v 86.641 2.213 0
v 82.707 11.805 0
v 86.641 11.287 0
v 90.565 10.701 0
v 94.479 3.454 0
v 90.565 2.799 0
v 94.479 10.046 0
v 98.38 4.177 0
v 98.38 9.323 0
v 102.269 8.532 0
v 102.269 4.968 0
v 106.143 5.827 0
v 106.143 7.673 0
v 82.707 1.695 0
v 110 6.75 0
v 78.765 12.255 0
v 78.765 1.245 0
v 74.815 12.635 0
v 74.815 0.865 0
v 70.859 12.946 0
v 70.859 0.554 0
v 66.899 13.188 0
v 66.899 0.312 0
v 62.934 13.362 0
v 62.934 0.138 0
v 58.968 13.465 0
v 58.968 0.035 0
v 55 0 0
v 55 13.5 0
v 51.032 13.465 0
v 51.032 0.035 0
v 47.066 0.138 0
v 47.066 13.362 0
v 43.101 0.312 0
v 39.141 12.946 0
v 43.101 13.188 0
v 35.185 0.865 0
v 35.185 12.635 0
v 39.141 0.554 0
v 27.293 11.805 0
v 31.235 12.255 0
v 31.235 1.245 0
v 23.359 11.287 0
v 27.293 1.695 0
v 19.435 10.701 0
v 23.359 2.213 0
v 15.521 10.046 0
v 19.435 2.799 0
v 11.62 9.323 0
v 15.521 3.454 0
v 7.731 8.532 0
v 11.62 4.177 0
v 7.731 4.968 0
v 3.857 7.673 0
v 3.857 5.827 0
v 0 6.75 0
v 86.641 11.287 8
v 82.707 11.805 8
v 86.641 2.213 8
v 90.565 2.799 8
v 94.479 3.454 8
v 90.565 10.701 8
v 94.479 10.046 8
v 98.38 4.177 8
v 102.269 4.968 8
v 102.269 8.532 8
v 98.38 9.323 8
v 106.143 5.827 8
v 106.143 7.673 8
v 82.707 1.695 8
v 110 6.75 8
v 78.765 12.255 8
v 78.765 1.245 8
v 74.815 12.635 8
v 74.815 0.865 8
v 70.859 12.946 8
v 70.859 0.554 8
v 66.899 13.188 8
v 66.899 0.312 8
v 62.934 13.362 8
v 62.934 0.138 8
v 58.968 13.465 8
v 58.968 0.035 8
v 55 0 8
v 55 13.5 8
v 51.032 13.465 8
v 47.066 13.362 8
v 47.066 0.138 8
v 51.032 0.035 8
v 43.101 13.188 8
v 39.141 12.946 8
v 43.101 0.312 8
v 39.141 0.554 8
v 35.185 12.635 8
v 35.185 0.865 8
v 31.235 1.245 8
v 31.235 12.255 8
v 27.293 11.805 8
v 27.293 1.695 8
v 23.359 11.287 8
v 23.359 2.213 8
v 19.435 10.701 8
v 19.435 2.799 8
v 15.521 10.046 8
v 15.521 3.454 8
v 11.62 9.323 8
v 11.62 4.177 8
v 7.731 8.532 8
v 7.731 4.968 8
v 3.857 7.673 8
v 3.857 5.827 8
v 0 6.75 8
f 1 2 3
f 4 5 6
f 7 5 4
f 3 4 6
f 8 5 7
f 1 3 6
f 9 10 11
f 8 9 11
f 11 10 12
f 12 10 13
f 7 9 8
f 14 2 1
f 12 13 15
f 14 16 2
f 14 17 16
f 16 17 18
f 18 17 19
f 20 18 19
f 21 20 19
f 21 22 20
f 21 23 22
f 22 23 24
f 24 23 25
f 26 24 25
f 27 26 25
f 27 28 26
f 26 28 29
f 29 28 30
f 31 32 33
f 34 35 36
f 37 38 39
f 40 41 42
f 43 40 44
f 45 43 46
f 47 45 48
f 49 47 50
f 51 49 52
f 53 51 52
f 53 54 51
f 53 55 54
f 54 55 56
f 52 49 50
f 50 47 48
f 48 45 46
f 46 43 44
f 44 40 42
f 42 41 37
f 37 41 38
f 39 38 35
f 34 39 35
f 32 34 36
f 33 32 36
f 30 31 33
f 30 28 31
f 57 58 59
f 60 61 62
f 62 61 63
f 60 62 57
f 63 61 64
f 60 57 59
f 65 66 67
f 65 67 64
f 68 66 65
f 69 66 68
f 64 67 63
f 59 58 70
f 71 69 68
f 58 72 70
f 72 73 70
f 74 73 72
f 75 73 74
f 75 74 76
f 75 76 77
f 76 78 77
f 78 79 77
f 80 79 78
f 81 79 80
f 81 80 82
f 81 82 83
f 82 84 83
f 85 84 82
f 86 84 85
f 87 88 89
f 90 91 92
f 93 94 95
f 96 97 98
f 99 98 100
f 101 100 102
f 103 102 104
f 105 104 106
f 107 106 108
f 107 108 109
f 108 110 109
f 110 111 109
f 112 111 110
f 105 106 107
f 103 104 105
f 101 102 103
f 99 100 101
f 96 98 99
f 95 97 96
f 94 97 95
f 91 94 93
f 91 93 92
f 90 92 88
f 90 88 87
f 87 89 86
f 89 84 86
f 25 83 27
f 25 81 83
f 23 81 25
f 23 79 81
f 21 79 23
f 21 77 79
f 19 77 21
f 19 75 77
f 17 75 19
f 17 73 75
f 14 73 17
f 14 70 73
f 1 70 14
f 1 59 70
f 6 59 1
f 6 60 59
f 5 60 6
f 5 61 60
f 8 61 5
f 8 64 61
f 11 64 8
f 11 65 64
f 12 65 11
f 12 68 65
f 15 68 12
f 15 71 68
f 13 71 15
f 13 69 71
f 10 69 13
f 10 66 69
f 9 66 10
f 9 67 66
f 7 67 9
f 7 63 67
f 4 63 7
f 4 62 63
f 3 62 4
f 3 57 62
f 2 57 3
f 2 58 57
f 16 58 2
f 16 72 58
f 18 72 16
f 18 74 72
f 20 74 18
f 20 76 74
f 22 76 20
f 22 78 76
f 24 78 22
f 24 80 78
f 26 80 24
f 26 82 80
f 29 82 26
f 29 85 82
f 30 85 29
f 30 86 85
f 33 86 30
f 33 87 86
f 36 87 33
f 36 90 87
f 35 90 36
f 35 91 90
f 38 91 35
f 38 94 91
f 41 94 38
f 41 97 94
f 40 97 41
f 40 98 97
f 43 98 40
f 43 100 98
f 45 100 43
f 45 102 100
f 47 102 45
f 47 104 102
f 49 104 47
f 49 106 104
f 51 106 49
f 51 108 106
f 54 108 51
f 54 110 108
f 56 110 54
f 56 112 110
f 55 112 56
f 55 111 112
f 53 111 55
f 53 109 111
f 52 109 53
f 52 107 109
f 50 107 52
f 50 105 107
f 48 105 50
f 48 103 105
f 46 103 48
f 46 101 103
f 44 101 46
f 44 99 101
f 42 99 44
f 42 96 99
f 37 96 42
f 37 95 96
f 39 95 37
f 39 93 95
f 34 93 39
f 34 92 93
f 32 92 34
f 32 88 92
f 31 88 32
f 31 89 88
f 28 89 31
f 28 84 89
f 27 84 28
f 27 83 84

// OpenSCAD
$fn = 32;

// ----------------------------------------------------------------------
// Arc profile plate: lens, 56 points
// ----------------------------------------------------------------------

// --- parameters (mm) ---
lens_chord = 110;         // chord length of the lens, X
arc_r = 227.35;           // radius of both arcs
arc_angle = 28;           // angle of each arc, degrees
sagitta = 6.75;           // bulge of each arc (half the lens height)
arc_step = 1;             // sampling step of the arcs, degrees
plate_t = 8;              // plate thickness, Z

bbox_y = 2 * sagitta;  // full lens height

profile = [[110, 6.75], [106.143, 7.673], [102.269, 8.532], [98.38, 9.323], [94.479, 10.046], [90.565, 10.701], [86.641, 11.287], [82.707, 11.805], [78.765, 12.255], [74.815, 12.635], [70.859, 12.946], [66.899, 13.188], [62.934, 13.362], [58.968, 13.465], [55, 13.5], [51.032, 13.465], [47.066, 13.362], [43.101, 13.188], [39.141, 12.946], [35.185, 12.635], [31.235, 12.255], [27.293, 11.805], [23.359, 11.287], [19.435, 10.701], [15.521, 10.046], [11.62, 9.323], [7.731, 8.532], [3.857, 7.673], [0, 6.75], [3.857, 5.827], [7.731, 4.968], [11.62, 4.177], [15.521, 3.454], [19.435, 2.799], [23.359, 2.213], [27.293, 1.695], [31.235, 1.245], [35.185, 0.865], [39.141, 0.554], [43.101, 0.312], [47.066, 0.138], [51.032, 0.035], [55, 0], [58.968, 0.035], [62.934, 0.138], [66.899, 0.312], [70.859, 0.554], [74.815, 0.865], [78.765, 1.245], [82.707, 1.695], [86.641, 2.213], [90.565, 2.799], [94.479, 3.454], [98.38, 4.177], [102.269, 4.968], [106.143, 5.827]];  // primary outline, 56 points, counter clockwise

// --- the one profile operation ---
linear_extrude(height = plate_t) polygon(points = profile);
